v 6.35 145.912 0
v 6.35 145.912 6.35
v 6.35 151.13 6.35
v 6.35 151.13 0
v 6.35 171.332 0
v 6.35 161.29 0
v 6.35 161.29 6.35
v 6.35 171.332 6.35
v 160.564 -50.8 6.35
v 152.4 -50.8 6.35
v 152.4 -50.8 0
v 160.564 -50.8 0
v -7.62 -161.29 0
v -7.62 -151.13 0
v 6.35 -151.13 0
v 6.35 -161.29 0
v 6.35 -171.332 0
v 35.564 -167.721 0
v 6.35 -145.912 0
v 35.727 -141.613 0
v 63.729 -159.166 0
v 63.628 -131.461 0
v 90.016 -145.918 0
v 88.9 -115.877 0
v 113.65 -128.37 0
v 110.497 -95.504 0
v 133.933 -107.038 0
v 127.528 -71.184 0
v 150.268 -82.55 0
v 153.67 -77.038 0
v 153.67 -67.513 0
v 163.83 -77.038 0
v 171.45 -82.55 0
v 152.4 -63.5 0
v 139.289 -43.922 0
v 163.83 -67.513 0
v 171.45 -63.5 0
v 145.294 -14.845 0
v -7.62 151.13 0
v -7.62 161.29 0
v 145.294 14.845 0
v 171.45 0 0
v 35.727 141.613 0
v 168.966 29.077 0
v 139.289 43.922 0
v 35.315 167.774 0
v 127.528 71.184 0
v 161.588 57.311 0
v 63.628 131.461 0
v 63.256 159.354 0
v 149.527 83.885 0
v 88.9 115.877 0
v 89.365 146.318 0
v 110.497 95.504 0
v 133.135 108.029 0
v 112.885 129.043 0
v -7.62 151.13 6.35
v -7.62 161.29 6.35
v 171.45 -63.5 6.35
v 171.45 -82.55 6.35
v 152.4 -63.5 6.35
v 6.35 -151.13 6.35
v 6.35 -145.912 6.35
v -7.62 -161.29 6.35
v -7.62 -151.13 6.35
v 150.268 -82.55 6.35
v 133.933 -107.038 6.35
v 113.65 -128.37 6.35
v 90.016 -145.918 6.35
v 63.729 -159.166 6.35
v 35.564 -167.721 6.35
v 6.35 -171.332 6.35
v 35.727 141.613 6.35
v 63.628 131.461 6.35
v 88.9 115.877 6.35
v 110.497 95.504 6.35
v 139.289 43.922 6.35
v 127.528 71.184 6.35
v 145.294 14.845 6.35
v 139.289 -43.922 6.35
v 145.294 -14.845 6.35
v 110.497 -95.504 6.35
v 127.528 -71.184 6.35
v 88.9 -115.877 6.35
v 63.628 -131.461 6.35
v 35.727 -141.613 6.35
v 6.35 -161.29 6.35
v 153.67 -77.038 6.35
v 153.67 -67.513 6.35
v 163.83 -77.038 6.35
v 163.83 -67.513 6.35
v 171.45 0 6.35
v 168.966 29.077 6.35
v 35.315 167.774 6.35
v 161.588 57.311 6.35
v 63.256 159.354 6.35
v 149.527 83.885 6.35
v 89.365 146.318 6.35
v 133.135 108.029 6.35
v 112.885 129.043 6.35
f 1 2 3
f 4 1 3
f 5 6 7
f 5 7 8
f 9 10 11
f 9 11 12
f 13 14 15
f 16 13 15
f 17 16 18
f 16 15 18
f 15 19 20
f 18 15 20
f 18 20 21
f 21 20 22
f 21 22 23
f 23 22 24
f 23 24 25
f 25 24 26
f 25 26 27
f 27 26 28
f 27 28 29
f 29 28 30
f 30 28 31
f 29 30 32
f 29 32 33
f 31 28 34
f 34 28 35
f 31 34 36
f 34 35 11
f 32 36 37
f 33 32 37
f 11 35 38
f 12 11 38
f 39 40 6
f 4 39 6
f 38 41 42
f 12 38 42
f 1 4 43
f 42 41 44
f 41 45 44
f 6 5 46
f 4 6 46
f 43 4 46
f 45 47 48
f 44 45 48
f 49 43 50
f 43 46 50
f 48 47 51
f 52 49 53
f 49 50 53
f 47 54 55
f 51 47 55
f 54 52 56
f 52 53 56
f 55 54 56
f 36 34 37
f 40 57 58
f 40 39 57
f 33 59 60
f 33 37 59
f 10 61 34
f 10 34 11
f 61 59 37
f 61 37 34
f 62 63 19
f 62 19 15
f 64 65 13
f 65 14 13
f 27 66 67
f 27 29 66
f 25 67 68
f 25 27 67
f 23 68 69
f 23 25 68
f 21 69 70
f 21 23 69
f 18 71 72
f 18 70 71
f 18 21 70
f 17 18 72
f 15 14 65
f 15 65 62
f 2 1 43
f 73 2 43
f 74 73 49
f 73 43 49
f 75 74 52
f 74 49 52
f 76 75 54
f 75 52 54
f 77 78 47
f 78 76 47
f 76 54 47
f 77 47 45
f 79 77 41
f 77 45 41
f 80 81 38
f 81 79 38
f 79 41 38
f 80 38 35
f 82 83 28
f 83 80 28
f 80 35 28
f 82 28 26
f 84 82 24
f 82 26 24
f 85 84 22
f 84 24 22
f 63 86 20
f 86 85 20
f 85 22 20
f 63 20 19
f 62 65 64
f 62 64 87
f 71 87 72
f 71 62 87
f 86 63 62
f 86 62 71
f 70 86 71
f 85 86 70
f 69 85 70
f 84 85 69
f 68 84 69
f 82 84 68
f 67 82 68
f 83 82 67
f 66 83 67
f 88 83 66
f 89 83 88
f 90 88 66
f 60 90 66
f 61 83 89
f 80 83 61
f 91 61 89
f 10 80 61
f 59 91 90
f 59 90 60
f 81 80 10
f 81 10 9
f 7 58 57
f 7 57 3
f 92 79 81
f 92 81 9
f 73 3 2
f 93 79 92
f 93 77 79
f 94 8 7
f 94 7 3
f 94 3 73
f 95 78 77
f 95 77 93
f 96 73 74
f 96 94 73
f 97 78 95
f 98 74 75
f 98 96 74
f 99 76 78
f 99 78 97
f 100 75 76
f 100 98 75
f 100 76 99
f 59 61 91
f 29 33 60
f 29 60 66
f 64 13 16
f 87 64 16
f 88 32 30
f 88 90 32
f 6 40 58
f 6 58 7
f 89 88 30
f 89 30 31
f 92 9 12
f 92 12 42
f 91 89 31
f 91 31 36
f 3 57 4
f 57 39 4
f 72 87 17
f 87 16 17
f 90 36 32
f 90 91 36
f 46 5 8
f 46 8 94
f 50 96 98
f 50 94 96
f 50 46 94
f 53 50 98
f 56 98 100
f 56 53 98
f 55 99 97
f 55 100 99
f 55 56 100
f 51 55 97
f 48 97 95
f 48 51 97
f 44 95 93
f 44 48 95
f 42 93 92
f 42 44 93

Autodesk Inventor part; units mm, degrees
ref_plane "YZ Plane" through (0, 0, 0) normal (1, 0, 0) x (0, 1, 0)
ref_plane "XZ Plane" through (0, 0, 0) normal (0, 1, 0) x (-1, 0, 0)
ref_plane "XY Plane" through (0, 0, 0) normal (0, 0, 1) x (1, 0, 0)
sketch "Sketch1" plane through (0, 0, 0) normal (0, 0, 1) x (1, 0, 0)
  arc A0 (0, -146.05) -> (0, 146.05) centre (0, 0) ccw
  line L0 (0, 0) -> (0, 226.0912) construction
  line L1 (0, 226.0912) -> (0, -237.3269) construction
  line L2 (6.35, 145.9119) -> (6.35, 171.3324)
  line L3 (6.35, -145.9119) -> (6.35, -171.3324)
  line L4 (0, 146.05) -> (0, 151.13)
  line L5 (0, 151.13) -> (6.35, 151.13)
  line L6 (6.35, 151.13) -> (-7.62, 151.13)
  line L7 (-7.62, 151.13) -> (-7.62, 161.29)
  line L8 (-7.62, 161.29) -> (6.35, 161.29)
  line L9 (0, -146.05) -> (0, -151.13)
  line L10 (0, -151.13) -> (6.35, -151.13)
  line L11 (6.35, -151.13) -> (-7.62, -151.13)
  line L12 (-7.62, -151.13) -> (-7.62, -161.29)
  line L13 (-7.62, -161.29) -> (6.35, -161.29)
  line L14 (171.45, 0) -> (171.45, -82.55)
  line L15 (171.45, -82.55) -> (150.2684, -82.55)
  arc A1 (0, -171.45) -> (150.2684, -82.55) centre (0, 0) ccw
  arc A2 (171.45, 0) -> (0, 171.45) centre (0, 0) ccw
  dimension "d20" = 292.1
  dimension "d21" = 6.35
  dimension "d22" = 6.35
  dimension "d23" = 5.08
  dimension "d24" = 13.97
  dimension "d25" = 10.16
  dimension "d26" = 5.08
  dimension "d27" = 13.97
  dimension "d28" = 10.16
  dimension "d29" = 82.55
  dimension "d45" = 171.45
  dimension "d46" = 171.45
ref_plane "Work Plane1" through (0, 0, 6.35) normal (0, 0, 1) x (1, 0, 0)
sketch "Sketch2" plane through (0, 0, 6.35) normal (0, 0, 1) x (1, 0, 0)
  line L0 (171.45, -82.55) -> (171.45, 0) projected
  line L1 (171.45, -82.55) -> (171.45, -77.0382) construction
  line L2 (171.45, -77.0382) -> (163.83, -77.0382) construction
  line L3 (163.83, -77.0382) -> (153.67, -77.0382)
  line L4 (153.67, -77.0382) -> (153.67, -67.5132)
  line L5 (153.67, -67.5132) -> (163.83, -67.5132)
  line L6 (163.83, -67.5132) -> (163.83, -77.0382)
  line L7 (171.45, 0) -> (171.45, -63.5) construction
  line L8 (171.45, -63.5) -> (152.4, -63.5)
  line L9 (152.4, -63.5) -> (152.4, -50.8)
  line L10 (152.4, -50.8) -> (160.5643, -50.8)
  arc A0 (171.45, 0) -> (6.35, 171.3324) centre (0, 0) ccw projected
  line L11 (160.5643, -50.8) -> (171.45, 0)
  line L12 (171.45, 0) -> (171.45, -63.5)
  point P0 (171.45, -44.45)
  dimension "d32" = 5.5118
  dimension "d33" = 7.62
  dimension "d34" = 10.16
  dimension "d35" = 9.525
  dimension "d38" = 63.5
  dimension "d39" = 19.05
  dimension "d40" = 12.7
  dimension "d44" = 102.095
extrude "Extrusion5" add sketch "Sketch1" along normal blind 6.35 contours A0 L2 A2 L14 L15 A1 L3 | L10 L3 L13 L12 L11 | L5 L6 L7 L8 L2
extrude "Extrusion6" cut sketch "Sketch2" against normal blind 6.35
properties part number "MiddleHoop"
